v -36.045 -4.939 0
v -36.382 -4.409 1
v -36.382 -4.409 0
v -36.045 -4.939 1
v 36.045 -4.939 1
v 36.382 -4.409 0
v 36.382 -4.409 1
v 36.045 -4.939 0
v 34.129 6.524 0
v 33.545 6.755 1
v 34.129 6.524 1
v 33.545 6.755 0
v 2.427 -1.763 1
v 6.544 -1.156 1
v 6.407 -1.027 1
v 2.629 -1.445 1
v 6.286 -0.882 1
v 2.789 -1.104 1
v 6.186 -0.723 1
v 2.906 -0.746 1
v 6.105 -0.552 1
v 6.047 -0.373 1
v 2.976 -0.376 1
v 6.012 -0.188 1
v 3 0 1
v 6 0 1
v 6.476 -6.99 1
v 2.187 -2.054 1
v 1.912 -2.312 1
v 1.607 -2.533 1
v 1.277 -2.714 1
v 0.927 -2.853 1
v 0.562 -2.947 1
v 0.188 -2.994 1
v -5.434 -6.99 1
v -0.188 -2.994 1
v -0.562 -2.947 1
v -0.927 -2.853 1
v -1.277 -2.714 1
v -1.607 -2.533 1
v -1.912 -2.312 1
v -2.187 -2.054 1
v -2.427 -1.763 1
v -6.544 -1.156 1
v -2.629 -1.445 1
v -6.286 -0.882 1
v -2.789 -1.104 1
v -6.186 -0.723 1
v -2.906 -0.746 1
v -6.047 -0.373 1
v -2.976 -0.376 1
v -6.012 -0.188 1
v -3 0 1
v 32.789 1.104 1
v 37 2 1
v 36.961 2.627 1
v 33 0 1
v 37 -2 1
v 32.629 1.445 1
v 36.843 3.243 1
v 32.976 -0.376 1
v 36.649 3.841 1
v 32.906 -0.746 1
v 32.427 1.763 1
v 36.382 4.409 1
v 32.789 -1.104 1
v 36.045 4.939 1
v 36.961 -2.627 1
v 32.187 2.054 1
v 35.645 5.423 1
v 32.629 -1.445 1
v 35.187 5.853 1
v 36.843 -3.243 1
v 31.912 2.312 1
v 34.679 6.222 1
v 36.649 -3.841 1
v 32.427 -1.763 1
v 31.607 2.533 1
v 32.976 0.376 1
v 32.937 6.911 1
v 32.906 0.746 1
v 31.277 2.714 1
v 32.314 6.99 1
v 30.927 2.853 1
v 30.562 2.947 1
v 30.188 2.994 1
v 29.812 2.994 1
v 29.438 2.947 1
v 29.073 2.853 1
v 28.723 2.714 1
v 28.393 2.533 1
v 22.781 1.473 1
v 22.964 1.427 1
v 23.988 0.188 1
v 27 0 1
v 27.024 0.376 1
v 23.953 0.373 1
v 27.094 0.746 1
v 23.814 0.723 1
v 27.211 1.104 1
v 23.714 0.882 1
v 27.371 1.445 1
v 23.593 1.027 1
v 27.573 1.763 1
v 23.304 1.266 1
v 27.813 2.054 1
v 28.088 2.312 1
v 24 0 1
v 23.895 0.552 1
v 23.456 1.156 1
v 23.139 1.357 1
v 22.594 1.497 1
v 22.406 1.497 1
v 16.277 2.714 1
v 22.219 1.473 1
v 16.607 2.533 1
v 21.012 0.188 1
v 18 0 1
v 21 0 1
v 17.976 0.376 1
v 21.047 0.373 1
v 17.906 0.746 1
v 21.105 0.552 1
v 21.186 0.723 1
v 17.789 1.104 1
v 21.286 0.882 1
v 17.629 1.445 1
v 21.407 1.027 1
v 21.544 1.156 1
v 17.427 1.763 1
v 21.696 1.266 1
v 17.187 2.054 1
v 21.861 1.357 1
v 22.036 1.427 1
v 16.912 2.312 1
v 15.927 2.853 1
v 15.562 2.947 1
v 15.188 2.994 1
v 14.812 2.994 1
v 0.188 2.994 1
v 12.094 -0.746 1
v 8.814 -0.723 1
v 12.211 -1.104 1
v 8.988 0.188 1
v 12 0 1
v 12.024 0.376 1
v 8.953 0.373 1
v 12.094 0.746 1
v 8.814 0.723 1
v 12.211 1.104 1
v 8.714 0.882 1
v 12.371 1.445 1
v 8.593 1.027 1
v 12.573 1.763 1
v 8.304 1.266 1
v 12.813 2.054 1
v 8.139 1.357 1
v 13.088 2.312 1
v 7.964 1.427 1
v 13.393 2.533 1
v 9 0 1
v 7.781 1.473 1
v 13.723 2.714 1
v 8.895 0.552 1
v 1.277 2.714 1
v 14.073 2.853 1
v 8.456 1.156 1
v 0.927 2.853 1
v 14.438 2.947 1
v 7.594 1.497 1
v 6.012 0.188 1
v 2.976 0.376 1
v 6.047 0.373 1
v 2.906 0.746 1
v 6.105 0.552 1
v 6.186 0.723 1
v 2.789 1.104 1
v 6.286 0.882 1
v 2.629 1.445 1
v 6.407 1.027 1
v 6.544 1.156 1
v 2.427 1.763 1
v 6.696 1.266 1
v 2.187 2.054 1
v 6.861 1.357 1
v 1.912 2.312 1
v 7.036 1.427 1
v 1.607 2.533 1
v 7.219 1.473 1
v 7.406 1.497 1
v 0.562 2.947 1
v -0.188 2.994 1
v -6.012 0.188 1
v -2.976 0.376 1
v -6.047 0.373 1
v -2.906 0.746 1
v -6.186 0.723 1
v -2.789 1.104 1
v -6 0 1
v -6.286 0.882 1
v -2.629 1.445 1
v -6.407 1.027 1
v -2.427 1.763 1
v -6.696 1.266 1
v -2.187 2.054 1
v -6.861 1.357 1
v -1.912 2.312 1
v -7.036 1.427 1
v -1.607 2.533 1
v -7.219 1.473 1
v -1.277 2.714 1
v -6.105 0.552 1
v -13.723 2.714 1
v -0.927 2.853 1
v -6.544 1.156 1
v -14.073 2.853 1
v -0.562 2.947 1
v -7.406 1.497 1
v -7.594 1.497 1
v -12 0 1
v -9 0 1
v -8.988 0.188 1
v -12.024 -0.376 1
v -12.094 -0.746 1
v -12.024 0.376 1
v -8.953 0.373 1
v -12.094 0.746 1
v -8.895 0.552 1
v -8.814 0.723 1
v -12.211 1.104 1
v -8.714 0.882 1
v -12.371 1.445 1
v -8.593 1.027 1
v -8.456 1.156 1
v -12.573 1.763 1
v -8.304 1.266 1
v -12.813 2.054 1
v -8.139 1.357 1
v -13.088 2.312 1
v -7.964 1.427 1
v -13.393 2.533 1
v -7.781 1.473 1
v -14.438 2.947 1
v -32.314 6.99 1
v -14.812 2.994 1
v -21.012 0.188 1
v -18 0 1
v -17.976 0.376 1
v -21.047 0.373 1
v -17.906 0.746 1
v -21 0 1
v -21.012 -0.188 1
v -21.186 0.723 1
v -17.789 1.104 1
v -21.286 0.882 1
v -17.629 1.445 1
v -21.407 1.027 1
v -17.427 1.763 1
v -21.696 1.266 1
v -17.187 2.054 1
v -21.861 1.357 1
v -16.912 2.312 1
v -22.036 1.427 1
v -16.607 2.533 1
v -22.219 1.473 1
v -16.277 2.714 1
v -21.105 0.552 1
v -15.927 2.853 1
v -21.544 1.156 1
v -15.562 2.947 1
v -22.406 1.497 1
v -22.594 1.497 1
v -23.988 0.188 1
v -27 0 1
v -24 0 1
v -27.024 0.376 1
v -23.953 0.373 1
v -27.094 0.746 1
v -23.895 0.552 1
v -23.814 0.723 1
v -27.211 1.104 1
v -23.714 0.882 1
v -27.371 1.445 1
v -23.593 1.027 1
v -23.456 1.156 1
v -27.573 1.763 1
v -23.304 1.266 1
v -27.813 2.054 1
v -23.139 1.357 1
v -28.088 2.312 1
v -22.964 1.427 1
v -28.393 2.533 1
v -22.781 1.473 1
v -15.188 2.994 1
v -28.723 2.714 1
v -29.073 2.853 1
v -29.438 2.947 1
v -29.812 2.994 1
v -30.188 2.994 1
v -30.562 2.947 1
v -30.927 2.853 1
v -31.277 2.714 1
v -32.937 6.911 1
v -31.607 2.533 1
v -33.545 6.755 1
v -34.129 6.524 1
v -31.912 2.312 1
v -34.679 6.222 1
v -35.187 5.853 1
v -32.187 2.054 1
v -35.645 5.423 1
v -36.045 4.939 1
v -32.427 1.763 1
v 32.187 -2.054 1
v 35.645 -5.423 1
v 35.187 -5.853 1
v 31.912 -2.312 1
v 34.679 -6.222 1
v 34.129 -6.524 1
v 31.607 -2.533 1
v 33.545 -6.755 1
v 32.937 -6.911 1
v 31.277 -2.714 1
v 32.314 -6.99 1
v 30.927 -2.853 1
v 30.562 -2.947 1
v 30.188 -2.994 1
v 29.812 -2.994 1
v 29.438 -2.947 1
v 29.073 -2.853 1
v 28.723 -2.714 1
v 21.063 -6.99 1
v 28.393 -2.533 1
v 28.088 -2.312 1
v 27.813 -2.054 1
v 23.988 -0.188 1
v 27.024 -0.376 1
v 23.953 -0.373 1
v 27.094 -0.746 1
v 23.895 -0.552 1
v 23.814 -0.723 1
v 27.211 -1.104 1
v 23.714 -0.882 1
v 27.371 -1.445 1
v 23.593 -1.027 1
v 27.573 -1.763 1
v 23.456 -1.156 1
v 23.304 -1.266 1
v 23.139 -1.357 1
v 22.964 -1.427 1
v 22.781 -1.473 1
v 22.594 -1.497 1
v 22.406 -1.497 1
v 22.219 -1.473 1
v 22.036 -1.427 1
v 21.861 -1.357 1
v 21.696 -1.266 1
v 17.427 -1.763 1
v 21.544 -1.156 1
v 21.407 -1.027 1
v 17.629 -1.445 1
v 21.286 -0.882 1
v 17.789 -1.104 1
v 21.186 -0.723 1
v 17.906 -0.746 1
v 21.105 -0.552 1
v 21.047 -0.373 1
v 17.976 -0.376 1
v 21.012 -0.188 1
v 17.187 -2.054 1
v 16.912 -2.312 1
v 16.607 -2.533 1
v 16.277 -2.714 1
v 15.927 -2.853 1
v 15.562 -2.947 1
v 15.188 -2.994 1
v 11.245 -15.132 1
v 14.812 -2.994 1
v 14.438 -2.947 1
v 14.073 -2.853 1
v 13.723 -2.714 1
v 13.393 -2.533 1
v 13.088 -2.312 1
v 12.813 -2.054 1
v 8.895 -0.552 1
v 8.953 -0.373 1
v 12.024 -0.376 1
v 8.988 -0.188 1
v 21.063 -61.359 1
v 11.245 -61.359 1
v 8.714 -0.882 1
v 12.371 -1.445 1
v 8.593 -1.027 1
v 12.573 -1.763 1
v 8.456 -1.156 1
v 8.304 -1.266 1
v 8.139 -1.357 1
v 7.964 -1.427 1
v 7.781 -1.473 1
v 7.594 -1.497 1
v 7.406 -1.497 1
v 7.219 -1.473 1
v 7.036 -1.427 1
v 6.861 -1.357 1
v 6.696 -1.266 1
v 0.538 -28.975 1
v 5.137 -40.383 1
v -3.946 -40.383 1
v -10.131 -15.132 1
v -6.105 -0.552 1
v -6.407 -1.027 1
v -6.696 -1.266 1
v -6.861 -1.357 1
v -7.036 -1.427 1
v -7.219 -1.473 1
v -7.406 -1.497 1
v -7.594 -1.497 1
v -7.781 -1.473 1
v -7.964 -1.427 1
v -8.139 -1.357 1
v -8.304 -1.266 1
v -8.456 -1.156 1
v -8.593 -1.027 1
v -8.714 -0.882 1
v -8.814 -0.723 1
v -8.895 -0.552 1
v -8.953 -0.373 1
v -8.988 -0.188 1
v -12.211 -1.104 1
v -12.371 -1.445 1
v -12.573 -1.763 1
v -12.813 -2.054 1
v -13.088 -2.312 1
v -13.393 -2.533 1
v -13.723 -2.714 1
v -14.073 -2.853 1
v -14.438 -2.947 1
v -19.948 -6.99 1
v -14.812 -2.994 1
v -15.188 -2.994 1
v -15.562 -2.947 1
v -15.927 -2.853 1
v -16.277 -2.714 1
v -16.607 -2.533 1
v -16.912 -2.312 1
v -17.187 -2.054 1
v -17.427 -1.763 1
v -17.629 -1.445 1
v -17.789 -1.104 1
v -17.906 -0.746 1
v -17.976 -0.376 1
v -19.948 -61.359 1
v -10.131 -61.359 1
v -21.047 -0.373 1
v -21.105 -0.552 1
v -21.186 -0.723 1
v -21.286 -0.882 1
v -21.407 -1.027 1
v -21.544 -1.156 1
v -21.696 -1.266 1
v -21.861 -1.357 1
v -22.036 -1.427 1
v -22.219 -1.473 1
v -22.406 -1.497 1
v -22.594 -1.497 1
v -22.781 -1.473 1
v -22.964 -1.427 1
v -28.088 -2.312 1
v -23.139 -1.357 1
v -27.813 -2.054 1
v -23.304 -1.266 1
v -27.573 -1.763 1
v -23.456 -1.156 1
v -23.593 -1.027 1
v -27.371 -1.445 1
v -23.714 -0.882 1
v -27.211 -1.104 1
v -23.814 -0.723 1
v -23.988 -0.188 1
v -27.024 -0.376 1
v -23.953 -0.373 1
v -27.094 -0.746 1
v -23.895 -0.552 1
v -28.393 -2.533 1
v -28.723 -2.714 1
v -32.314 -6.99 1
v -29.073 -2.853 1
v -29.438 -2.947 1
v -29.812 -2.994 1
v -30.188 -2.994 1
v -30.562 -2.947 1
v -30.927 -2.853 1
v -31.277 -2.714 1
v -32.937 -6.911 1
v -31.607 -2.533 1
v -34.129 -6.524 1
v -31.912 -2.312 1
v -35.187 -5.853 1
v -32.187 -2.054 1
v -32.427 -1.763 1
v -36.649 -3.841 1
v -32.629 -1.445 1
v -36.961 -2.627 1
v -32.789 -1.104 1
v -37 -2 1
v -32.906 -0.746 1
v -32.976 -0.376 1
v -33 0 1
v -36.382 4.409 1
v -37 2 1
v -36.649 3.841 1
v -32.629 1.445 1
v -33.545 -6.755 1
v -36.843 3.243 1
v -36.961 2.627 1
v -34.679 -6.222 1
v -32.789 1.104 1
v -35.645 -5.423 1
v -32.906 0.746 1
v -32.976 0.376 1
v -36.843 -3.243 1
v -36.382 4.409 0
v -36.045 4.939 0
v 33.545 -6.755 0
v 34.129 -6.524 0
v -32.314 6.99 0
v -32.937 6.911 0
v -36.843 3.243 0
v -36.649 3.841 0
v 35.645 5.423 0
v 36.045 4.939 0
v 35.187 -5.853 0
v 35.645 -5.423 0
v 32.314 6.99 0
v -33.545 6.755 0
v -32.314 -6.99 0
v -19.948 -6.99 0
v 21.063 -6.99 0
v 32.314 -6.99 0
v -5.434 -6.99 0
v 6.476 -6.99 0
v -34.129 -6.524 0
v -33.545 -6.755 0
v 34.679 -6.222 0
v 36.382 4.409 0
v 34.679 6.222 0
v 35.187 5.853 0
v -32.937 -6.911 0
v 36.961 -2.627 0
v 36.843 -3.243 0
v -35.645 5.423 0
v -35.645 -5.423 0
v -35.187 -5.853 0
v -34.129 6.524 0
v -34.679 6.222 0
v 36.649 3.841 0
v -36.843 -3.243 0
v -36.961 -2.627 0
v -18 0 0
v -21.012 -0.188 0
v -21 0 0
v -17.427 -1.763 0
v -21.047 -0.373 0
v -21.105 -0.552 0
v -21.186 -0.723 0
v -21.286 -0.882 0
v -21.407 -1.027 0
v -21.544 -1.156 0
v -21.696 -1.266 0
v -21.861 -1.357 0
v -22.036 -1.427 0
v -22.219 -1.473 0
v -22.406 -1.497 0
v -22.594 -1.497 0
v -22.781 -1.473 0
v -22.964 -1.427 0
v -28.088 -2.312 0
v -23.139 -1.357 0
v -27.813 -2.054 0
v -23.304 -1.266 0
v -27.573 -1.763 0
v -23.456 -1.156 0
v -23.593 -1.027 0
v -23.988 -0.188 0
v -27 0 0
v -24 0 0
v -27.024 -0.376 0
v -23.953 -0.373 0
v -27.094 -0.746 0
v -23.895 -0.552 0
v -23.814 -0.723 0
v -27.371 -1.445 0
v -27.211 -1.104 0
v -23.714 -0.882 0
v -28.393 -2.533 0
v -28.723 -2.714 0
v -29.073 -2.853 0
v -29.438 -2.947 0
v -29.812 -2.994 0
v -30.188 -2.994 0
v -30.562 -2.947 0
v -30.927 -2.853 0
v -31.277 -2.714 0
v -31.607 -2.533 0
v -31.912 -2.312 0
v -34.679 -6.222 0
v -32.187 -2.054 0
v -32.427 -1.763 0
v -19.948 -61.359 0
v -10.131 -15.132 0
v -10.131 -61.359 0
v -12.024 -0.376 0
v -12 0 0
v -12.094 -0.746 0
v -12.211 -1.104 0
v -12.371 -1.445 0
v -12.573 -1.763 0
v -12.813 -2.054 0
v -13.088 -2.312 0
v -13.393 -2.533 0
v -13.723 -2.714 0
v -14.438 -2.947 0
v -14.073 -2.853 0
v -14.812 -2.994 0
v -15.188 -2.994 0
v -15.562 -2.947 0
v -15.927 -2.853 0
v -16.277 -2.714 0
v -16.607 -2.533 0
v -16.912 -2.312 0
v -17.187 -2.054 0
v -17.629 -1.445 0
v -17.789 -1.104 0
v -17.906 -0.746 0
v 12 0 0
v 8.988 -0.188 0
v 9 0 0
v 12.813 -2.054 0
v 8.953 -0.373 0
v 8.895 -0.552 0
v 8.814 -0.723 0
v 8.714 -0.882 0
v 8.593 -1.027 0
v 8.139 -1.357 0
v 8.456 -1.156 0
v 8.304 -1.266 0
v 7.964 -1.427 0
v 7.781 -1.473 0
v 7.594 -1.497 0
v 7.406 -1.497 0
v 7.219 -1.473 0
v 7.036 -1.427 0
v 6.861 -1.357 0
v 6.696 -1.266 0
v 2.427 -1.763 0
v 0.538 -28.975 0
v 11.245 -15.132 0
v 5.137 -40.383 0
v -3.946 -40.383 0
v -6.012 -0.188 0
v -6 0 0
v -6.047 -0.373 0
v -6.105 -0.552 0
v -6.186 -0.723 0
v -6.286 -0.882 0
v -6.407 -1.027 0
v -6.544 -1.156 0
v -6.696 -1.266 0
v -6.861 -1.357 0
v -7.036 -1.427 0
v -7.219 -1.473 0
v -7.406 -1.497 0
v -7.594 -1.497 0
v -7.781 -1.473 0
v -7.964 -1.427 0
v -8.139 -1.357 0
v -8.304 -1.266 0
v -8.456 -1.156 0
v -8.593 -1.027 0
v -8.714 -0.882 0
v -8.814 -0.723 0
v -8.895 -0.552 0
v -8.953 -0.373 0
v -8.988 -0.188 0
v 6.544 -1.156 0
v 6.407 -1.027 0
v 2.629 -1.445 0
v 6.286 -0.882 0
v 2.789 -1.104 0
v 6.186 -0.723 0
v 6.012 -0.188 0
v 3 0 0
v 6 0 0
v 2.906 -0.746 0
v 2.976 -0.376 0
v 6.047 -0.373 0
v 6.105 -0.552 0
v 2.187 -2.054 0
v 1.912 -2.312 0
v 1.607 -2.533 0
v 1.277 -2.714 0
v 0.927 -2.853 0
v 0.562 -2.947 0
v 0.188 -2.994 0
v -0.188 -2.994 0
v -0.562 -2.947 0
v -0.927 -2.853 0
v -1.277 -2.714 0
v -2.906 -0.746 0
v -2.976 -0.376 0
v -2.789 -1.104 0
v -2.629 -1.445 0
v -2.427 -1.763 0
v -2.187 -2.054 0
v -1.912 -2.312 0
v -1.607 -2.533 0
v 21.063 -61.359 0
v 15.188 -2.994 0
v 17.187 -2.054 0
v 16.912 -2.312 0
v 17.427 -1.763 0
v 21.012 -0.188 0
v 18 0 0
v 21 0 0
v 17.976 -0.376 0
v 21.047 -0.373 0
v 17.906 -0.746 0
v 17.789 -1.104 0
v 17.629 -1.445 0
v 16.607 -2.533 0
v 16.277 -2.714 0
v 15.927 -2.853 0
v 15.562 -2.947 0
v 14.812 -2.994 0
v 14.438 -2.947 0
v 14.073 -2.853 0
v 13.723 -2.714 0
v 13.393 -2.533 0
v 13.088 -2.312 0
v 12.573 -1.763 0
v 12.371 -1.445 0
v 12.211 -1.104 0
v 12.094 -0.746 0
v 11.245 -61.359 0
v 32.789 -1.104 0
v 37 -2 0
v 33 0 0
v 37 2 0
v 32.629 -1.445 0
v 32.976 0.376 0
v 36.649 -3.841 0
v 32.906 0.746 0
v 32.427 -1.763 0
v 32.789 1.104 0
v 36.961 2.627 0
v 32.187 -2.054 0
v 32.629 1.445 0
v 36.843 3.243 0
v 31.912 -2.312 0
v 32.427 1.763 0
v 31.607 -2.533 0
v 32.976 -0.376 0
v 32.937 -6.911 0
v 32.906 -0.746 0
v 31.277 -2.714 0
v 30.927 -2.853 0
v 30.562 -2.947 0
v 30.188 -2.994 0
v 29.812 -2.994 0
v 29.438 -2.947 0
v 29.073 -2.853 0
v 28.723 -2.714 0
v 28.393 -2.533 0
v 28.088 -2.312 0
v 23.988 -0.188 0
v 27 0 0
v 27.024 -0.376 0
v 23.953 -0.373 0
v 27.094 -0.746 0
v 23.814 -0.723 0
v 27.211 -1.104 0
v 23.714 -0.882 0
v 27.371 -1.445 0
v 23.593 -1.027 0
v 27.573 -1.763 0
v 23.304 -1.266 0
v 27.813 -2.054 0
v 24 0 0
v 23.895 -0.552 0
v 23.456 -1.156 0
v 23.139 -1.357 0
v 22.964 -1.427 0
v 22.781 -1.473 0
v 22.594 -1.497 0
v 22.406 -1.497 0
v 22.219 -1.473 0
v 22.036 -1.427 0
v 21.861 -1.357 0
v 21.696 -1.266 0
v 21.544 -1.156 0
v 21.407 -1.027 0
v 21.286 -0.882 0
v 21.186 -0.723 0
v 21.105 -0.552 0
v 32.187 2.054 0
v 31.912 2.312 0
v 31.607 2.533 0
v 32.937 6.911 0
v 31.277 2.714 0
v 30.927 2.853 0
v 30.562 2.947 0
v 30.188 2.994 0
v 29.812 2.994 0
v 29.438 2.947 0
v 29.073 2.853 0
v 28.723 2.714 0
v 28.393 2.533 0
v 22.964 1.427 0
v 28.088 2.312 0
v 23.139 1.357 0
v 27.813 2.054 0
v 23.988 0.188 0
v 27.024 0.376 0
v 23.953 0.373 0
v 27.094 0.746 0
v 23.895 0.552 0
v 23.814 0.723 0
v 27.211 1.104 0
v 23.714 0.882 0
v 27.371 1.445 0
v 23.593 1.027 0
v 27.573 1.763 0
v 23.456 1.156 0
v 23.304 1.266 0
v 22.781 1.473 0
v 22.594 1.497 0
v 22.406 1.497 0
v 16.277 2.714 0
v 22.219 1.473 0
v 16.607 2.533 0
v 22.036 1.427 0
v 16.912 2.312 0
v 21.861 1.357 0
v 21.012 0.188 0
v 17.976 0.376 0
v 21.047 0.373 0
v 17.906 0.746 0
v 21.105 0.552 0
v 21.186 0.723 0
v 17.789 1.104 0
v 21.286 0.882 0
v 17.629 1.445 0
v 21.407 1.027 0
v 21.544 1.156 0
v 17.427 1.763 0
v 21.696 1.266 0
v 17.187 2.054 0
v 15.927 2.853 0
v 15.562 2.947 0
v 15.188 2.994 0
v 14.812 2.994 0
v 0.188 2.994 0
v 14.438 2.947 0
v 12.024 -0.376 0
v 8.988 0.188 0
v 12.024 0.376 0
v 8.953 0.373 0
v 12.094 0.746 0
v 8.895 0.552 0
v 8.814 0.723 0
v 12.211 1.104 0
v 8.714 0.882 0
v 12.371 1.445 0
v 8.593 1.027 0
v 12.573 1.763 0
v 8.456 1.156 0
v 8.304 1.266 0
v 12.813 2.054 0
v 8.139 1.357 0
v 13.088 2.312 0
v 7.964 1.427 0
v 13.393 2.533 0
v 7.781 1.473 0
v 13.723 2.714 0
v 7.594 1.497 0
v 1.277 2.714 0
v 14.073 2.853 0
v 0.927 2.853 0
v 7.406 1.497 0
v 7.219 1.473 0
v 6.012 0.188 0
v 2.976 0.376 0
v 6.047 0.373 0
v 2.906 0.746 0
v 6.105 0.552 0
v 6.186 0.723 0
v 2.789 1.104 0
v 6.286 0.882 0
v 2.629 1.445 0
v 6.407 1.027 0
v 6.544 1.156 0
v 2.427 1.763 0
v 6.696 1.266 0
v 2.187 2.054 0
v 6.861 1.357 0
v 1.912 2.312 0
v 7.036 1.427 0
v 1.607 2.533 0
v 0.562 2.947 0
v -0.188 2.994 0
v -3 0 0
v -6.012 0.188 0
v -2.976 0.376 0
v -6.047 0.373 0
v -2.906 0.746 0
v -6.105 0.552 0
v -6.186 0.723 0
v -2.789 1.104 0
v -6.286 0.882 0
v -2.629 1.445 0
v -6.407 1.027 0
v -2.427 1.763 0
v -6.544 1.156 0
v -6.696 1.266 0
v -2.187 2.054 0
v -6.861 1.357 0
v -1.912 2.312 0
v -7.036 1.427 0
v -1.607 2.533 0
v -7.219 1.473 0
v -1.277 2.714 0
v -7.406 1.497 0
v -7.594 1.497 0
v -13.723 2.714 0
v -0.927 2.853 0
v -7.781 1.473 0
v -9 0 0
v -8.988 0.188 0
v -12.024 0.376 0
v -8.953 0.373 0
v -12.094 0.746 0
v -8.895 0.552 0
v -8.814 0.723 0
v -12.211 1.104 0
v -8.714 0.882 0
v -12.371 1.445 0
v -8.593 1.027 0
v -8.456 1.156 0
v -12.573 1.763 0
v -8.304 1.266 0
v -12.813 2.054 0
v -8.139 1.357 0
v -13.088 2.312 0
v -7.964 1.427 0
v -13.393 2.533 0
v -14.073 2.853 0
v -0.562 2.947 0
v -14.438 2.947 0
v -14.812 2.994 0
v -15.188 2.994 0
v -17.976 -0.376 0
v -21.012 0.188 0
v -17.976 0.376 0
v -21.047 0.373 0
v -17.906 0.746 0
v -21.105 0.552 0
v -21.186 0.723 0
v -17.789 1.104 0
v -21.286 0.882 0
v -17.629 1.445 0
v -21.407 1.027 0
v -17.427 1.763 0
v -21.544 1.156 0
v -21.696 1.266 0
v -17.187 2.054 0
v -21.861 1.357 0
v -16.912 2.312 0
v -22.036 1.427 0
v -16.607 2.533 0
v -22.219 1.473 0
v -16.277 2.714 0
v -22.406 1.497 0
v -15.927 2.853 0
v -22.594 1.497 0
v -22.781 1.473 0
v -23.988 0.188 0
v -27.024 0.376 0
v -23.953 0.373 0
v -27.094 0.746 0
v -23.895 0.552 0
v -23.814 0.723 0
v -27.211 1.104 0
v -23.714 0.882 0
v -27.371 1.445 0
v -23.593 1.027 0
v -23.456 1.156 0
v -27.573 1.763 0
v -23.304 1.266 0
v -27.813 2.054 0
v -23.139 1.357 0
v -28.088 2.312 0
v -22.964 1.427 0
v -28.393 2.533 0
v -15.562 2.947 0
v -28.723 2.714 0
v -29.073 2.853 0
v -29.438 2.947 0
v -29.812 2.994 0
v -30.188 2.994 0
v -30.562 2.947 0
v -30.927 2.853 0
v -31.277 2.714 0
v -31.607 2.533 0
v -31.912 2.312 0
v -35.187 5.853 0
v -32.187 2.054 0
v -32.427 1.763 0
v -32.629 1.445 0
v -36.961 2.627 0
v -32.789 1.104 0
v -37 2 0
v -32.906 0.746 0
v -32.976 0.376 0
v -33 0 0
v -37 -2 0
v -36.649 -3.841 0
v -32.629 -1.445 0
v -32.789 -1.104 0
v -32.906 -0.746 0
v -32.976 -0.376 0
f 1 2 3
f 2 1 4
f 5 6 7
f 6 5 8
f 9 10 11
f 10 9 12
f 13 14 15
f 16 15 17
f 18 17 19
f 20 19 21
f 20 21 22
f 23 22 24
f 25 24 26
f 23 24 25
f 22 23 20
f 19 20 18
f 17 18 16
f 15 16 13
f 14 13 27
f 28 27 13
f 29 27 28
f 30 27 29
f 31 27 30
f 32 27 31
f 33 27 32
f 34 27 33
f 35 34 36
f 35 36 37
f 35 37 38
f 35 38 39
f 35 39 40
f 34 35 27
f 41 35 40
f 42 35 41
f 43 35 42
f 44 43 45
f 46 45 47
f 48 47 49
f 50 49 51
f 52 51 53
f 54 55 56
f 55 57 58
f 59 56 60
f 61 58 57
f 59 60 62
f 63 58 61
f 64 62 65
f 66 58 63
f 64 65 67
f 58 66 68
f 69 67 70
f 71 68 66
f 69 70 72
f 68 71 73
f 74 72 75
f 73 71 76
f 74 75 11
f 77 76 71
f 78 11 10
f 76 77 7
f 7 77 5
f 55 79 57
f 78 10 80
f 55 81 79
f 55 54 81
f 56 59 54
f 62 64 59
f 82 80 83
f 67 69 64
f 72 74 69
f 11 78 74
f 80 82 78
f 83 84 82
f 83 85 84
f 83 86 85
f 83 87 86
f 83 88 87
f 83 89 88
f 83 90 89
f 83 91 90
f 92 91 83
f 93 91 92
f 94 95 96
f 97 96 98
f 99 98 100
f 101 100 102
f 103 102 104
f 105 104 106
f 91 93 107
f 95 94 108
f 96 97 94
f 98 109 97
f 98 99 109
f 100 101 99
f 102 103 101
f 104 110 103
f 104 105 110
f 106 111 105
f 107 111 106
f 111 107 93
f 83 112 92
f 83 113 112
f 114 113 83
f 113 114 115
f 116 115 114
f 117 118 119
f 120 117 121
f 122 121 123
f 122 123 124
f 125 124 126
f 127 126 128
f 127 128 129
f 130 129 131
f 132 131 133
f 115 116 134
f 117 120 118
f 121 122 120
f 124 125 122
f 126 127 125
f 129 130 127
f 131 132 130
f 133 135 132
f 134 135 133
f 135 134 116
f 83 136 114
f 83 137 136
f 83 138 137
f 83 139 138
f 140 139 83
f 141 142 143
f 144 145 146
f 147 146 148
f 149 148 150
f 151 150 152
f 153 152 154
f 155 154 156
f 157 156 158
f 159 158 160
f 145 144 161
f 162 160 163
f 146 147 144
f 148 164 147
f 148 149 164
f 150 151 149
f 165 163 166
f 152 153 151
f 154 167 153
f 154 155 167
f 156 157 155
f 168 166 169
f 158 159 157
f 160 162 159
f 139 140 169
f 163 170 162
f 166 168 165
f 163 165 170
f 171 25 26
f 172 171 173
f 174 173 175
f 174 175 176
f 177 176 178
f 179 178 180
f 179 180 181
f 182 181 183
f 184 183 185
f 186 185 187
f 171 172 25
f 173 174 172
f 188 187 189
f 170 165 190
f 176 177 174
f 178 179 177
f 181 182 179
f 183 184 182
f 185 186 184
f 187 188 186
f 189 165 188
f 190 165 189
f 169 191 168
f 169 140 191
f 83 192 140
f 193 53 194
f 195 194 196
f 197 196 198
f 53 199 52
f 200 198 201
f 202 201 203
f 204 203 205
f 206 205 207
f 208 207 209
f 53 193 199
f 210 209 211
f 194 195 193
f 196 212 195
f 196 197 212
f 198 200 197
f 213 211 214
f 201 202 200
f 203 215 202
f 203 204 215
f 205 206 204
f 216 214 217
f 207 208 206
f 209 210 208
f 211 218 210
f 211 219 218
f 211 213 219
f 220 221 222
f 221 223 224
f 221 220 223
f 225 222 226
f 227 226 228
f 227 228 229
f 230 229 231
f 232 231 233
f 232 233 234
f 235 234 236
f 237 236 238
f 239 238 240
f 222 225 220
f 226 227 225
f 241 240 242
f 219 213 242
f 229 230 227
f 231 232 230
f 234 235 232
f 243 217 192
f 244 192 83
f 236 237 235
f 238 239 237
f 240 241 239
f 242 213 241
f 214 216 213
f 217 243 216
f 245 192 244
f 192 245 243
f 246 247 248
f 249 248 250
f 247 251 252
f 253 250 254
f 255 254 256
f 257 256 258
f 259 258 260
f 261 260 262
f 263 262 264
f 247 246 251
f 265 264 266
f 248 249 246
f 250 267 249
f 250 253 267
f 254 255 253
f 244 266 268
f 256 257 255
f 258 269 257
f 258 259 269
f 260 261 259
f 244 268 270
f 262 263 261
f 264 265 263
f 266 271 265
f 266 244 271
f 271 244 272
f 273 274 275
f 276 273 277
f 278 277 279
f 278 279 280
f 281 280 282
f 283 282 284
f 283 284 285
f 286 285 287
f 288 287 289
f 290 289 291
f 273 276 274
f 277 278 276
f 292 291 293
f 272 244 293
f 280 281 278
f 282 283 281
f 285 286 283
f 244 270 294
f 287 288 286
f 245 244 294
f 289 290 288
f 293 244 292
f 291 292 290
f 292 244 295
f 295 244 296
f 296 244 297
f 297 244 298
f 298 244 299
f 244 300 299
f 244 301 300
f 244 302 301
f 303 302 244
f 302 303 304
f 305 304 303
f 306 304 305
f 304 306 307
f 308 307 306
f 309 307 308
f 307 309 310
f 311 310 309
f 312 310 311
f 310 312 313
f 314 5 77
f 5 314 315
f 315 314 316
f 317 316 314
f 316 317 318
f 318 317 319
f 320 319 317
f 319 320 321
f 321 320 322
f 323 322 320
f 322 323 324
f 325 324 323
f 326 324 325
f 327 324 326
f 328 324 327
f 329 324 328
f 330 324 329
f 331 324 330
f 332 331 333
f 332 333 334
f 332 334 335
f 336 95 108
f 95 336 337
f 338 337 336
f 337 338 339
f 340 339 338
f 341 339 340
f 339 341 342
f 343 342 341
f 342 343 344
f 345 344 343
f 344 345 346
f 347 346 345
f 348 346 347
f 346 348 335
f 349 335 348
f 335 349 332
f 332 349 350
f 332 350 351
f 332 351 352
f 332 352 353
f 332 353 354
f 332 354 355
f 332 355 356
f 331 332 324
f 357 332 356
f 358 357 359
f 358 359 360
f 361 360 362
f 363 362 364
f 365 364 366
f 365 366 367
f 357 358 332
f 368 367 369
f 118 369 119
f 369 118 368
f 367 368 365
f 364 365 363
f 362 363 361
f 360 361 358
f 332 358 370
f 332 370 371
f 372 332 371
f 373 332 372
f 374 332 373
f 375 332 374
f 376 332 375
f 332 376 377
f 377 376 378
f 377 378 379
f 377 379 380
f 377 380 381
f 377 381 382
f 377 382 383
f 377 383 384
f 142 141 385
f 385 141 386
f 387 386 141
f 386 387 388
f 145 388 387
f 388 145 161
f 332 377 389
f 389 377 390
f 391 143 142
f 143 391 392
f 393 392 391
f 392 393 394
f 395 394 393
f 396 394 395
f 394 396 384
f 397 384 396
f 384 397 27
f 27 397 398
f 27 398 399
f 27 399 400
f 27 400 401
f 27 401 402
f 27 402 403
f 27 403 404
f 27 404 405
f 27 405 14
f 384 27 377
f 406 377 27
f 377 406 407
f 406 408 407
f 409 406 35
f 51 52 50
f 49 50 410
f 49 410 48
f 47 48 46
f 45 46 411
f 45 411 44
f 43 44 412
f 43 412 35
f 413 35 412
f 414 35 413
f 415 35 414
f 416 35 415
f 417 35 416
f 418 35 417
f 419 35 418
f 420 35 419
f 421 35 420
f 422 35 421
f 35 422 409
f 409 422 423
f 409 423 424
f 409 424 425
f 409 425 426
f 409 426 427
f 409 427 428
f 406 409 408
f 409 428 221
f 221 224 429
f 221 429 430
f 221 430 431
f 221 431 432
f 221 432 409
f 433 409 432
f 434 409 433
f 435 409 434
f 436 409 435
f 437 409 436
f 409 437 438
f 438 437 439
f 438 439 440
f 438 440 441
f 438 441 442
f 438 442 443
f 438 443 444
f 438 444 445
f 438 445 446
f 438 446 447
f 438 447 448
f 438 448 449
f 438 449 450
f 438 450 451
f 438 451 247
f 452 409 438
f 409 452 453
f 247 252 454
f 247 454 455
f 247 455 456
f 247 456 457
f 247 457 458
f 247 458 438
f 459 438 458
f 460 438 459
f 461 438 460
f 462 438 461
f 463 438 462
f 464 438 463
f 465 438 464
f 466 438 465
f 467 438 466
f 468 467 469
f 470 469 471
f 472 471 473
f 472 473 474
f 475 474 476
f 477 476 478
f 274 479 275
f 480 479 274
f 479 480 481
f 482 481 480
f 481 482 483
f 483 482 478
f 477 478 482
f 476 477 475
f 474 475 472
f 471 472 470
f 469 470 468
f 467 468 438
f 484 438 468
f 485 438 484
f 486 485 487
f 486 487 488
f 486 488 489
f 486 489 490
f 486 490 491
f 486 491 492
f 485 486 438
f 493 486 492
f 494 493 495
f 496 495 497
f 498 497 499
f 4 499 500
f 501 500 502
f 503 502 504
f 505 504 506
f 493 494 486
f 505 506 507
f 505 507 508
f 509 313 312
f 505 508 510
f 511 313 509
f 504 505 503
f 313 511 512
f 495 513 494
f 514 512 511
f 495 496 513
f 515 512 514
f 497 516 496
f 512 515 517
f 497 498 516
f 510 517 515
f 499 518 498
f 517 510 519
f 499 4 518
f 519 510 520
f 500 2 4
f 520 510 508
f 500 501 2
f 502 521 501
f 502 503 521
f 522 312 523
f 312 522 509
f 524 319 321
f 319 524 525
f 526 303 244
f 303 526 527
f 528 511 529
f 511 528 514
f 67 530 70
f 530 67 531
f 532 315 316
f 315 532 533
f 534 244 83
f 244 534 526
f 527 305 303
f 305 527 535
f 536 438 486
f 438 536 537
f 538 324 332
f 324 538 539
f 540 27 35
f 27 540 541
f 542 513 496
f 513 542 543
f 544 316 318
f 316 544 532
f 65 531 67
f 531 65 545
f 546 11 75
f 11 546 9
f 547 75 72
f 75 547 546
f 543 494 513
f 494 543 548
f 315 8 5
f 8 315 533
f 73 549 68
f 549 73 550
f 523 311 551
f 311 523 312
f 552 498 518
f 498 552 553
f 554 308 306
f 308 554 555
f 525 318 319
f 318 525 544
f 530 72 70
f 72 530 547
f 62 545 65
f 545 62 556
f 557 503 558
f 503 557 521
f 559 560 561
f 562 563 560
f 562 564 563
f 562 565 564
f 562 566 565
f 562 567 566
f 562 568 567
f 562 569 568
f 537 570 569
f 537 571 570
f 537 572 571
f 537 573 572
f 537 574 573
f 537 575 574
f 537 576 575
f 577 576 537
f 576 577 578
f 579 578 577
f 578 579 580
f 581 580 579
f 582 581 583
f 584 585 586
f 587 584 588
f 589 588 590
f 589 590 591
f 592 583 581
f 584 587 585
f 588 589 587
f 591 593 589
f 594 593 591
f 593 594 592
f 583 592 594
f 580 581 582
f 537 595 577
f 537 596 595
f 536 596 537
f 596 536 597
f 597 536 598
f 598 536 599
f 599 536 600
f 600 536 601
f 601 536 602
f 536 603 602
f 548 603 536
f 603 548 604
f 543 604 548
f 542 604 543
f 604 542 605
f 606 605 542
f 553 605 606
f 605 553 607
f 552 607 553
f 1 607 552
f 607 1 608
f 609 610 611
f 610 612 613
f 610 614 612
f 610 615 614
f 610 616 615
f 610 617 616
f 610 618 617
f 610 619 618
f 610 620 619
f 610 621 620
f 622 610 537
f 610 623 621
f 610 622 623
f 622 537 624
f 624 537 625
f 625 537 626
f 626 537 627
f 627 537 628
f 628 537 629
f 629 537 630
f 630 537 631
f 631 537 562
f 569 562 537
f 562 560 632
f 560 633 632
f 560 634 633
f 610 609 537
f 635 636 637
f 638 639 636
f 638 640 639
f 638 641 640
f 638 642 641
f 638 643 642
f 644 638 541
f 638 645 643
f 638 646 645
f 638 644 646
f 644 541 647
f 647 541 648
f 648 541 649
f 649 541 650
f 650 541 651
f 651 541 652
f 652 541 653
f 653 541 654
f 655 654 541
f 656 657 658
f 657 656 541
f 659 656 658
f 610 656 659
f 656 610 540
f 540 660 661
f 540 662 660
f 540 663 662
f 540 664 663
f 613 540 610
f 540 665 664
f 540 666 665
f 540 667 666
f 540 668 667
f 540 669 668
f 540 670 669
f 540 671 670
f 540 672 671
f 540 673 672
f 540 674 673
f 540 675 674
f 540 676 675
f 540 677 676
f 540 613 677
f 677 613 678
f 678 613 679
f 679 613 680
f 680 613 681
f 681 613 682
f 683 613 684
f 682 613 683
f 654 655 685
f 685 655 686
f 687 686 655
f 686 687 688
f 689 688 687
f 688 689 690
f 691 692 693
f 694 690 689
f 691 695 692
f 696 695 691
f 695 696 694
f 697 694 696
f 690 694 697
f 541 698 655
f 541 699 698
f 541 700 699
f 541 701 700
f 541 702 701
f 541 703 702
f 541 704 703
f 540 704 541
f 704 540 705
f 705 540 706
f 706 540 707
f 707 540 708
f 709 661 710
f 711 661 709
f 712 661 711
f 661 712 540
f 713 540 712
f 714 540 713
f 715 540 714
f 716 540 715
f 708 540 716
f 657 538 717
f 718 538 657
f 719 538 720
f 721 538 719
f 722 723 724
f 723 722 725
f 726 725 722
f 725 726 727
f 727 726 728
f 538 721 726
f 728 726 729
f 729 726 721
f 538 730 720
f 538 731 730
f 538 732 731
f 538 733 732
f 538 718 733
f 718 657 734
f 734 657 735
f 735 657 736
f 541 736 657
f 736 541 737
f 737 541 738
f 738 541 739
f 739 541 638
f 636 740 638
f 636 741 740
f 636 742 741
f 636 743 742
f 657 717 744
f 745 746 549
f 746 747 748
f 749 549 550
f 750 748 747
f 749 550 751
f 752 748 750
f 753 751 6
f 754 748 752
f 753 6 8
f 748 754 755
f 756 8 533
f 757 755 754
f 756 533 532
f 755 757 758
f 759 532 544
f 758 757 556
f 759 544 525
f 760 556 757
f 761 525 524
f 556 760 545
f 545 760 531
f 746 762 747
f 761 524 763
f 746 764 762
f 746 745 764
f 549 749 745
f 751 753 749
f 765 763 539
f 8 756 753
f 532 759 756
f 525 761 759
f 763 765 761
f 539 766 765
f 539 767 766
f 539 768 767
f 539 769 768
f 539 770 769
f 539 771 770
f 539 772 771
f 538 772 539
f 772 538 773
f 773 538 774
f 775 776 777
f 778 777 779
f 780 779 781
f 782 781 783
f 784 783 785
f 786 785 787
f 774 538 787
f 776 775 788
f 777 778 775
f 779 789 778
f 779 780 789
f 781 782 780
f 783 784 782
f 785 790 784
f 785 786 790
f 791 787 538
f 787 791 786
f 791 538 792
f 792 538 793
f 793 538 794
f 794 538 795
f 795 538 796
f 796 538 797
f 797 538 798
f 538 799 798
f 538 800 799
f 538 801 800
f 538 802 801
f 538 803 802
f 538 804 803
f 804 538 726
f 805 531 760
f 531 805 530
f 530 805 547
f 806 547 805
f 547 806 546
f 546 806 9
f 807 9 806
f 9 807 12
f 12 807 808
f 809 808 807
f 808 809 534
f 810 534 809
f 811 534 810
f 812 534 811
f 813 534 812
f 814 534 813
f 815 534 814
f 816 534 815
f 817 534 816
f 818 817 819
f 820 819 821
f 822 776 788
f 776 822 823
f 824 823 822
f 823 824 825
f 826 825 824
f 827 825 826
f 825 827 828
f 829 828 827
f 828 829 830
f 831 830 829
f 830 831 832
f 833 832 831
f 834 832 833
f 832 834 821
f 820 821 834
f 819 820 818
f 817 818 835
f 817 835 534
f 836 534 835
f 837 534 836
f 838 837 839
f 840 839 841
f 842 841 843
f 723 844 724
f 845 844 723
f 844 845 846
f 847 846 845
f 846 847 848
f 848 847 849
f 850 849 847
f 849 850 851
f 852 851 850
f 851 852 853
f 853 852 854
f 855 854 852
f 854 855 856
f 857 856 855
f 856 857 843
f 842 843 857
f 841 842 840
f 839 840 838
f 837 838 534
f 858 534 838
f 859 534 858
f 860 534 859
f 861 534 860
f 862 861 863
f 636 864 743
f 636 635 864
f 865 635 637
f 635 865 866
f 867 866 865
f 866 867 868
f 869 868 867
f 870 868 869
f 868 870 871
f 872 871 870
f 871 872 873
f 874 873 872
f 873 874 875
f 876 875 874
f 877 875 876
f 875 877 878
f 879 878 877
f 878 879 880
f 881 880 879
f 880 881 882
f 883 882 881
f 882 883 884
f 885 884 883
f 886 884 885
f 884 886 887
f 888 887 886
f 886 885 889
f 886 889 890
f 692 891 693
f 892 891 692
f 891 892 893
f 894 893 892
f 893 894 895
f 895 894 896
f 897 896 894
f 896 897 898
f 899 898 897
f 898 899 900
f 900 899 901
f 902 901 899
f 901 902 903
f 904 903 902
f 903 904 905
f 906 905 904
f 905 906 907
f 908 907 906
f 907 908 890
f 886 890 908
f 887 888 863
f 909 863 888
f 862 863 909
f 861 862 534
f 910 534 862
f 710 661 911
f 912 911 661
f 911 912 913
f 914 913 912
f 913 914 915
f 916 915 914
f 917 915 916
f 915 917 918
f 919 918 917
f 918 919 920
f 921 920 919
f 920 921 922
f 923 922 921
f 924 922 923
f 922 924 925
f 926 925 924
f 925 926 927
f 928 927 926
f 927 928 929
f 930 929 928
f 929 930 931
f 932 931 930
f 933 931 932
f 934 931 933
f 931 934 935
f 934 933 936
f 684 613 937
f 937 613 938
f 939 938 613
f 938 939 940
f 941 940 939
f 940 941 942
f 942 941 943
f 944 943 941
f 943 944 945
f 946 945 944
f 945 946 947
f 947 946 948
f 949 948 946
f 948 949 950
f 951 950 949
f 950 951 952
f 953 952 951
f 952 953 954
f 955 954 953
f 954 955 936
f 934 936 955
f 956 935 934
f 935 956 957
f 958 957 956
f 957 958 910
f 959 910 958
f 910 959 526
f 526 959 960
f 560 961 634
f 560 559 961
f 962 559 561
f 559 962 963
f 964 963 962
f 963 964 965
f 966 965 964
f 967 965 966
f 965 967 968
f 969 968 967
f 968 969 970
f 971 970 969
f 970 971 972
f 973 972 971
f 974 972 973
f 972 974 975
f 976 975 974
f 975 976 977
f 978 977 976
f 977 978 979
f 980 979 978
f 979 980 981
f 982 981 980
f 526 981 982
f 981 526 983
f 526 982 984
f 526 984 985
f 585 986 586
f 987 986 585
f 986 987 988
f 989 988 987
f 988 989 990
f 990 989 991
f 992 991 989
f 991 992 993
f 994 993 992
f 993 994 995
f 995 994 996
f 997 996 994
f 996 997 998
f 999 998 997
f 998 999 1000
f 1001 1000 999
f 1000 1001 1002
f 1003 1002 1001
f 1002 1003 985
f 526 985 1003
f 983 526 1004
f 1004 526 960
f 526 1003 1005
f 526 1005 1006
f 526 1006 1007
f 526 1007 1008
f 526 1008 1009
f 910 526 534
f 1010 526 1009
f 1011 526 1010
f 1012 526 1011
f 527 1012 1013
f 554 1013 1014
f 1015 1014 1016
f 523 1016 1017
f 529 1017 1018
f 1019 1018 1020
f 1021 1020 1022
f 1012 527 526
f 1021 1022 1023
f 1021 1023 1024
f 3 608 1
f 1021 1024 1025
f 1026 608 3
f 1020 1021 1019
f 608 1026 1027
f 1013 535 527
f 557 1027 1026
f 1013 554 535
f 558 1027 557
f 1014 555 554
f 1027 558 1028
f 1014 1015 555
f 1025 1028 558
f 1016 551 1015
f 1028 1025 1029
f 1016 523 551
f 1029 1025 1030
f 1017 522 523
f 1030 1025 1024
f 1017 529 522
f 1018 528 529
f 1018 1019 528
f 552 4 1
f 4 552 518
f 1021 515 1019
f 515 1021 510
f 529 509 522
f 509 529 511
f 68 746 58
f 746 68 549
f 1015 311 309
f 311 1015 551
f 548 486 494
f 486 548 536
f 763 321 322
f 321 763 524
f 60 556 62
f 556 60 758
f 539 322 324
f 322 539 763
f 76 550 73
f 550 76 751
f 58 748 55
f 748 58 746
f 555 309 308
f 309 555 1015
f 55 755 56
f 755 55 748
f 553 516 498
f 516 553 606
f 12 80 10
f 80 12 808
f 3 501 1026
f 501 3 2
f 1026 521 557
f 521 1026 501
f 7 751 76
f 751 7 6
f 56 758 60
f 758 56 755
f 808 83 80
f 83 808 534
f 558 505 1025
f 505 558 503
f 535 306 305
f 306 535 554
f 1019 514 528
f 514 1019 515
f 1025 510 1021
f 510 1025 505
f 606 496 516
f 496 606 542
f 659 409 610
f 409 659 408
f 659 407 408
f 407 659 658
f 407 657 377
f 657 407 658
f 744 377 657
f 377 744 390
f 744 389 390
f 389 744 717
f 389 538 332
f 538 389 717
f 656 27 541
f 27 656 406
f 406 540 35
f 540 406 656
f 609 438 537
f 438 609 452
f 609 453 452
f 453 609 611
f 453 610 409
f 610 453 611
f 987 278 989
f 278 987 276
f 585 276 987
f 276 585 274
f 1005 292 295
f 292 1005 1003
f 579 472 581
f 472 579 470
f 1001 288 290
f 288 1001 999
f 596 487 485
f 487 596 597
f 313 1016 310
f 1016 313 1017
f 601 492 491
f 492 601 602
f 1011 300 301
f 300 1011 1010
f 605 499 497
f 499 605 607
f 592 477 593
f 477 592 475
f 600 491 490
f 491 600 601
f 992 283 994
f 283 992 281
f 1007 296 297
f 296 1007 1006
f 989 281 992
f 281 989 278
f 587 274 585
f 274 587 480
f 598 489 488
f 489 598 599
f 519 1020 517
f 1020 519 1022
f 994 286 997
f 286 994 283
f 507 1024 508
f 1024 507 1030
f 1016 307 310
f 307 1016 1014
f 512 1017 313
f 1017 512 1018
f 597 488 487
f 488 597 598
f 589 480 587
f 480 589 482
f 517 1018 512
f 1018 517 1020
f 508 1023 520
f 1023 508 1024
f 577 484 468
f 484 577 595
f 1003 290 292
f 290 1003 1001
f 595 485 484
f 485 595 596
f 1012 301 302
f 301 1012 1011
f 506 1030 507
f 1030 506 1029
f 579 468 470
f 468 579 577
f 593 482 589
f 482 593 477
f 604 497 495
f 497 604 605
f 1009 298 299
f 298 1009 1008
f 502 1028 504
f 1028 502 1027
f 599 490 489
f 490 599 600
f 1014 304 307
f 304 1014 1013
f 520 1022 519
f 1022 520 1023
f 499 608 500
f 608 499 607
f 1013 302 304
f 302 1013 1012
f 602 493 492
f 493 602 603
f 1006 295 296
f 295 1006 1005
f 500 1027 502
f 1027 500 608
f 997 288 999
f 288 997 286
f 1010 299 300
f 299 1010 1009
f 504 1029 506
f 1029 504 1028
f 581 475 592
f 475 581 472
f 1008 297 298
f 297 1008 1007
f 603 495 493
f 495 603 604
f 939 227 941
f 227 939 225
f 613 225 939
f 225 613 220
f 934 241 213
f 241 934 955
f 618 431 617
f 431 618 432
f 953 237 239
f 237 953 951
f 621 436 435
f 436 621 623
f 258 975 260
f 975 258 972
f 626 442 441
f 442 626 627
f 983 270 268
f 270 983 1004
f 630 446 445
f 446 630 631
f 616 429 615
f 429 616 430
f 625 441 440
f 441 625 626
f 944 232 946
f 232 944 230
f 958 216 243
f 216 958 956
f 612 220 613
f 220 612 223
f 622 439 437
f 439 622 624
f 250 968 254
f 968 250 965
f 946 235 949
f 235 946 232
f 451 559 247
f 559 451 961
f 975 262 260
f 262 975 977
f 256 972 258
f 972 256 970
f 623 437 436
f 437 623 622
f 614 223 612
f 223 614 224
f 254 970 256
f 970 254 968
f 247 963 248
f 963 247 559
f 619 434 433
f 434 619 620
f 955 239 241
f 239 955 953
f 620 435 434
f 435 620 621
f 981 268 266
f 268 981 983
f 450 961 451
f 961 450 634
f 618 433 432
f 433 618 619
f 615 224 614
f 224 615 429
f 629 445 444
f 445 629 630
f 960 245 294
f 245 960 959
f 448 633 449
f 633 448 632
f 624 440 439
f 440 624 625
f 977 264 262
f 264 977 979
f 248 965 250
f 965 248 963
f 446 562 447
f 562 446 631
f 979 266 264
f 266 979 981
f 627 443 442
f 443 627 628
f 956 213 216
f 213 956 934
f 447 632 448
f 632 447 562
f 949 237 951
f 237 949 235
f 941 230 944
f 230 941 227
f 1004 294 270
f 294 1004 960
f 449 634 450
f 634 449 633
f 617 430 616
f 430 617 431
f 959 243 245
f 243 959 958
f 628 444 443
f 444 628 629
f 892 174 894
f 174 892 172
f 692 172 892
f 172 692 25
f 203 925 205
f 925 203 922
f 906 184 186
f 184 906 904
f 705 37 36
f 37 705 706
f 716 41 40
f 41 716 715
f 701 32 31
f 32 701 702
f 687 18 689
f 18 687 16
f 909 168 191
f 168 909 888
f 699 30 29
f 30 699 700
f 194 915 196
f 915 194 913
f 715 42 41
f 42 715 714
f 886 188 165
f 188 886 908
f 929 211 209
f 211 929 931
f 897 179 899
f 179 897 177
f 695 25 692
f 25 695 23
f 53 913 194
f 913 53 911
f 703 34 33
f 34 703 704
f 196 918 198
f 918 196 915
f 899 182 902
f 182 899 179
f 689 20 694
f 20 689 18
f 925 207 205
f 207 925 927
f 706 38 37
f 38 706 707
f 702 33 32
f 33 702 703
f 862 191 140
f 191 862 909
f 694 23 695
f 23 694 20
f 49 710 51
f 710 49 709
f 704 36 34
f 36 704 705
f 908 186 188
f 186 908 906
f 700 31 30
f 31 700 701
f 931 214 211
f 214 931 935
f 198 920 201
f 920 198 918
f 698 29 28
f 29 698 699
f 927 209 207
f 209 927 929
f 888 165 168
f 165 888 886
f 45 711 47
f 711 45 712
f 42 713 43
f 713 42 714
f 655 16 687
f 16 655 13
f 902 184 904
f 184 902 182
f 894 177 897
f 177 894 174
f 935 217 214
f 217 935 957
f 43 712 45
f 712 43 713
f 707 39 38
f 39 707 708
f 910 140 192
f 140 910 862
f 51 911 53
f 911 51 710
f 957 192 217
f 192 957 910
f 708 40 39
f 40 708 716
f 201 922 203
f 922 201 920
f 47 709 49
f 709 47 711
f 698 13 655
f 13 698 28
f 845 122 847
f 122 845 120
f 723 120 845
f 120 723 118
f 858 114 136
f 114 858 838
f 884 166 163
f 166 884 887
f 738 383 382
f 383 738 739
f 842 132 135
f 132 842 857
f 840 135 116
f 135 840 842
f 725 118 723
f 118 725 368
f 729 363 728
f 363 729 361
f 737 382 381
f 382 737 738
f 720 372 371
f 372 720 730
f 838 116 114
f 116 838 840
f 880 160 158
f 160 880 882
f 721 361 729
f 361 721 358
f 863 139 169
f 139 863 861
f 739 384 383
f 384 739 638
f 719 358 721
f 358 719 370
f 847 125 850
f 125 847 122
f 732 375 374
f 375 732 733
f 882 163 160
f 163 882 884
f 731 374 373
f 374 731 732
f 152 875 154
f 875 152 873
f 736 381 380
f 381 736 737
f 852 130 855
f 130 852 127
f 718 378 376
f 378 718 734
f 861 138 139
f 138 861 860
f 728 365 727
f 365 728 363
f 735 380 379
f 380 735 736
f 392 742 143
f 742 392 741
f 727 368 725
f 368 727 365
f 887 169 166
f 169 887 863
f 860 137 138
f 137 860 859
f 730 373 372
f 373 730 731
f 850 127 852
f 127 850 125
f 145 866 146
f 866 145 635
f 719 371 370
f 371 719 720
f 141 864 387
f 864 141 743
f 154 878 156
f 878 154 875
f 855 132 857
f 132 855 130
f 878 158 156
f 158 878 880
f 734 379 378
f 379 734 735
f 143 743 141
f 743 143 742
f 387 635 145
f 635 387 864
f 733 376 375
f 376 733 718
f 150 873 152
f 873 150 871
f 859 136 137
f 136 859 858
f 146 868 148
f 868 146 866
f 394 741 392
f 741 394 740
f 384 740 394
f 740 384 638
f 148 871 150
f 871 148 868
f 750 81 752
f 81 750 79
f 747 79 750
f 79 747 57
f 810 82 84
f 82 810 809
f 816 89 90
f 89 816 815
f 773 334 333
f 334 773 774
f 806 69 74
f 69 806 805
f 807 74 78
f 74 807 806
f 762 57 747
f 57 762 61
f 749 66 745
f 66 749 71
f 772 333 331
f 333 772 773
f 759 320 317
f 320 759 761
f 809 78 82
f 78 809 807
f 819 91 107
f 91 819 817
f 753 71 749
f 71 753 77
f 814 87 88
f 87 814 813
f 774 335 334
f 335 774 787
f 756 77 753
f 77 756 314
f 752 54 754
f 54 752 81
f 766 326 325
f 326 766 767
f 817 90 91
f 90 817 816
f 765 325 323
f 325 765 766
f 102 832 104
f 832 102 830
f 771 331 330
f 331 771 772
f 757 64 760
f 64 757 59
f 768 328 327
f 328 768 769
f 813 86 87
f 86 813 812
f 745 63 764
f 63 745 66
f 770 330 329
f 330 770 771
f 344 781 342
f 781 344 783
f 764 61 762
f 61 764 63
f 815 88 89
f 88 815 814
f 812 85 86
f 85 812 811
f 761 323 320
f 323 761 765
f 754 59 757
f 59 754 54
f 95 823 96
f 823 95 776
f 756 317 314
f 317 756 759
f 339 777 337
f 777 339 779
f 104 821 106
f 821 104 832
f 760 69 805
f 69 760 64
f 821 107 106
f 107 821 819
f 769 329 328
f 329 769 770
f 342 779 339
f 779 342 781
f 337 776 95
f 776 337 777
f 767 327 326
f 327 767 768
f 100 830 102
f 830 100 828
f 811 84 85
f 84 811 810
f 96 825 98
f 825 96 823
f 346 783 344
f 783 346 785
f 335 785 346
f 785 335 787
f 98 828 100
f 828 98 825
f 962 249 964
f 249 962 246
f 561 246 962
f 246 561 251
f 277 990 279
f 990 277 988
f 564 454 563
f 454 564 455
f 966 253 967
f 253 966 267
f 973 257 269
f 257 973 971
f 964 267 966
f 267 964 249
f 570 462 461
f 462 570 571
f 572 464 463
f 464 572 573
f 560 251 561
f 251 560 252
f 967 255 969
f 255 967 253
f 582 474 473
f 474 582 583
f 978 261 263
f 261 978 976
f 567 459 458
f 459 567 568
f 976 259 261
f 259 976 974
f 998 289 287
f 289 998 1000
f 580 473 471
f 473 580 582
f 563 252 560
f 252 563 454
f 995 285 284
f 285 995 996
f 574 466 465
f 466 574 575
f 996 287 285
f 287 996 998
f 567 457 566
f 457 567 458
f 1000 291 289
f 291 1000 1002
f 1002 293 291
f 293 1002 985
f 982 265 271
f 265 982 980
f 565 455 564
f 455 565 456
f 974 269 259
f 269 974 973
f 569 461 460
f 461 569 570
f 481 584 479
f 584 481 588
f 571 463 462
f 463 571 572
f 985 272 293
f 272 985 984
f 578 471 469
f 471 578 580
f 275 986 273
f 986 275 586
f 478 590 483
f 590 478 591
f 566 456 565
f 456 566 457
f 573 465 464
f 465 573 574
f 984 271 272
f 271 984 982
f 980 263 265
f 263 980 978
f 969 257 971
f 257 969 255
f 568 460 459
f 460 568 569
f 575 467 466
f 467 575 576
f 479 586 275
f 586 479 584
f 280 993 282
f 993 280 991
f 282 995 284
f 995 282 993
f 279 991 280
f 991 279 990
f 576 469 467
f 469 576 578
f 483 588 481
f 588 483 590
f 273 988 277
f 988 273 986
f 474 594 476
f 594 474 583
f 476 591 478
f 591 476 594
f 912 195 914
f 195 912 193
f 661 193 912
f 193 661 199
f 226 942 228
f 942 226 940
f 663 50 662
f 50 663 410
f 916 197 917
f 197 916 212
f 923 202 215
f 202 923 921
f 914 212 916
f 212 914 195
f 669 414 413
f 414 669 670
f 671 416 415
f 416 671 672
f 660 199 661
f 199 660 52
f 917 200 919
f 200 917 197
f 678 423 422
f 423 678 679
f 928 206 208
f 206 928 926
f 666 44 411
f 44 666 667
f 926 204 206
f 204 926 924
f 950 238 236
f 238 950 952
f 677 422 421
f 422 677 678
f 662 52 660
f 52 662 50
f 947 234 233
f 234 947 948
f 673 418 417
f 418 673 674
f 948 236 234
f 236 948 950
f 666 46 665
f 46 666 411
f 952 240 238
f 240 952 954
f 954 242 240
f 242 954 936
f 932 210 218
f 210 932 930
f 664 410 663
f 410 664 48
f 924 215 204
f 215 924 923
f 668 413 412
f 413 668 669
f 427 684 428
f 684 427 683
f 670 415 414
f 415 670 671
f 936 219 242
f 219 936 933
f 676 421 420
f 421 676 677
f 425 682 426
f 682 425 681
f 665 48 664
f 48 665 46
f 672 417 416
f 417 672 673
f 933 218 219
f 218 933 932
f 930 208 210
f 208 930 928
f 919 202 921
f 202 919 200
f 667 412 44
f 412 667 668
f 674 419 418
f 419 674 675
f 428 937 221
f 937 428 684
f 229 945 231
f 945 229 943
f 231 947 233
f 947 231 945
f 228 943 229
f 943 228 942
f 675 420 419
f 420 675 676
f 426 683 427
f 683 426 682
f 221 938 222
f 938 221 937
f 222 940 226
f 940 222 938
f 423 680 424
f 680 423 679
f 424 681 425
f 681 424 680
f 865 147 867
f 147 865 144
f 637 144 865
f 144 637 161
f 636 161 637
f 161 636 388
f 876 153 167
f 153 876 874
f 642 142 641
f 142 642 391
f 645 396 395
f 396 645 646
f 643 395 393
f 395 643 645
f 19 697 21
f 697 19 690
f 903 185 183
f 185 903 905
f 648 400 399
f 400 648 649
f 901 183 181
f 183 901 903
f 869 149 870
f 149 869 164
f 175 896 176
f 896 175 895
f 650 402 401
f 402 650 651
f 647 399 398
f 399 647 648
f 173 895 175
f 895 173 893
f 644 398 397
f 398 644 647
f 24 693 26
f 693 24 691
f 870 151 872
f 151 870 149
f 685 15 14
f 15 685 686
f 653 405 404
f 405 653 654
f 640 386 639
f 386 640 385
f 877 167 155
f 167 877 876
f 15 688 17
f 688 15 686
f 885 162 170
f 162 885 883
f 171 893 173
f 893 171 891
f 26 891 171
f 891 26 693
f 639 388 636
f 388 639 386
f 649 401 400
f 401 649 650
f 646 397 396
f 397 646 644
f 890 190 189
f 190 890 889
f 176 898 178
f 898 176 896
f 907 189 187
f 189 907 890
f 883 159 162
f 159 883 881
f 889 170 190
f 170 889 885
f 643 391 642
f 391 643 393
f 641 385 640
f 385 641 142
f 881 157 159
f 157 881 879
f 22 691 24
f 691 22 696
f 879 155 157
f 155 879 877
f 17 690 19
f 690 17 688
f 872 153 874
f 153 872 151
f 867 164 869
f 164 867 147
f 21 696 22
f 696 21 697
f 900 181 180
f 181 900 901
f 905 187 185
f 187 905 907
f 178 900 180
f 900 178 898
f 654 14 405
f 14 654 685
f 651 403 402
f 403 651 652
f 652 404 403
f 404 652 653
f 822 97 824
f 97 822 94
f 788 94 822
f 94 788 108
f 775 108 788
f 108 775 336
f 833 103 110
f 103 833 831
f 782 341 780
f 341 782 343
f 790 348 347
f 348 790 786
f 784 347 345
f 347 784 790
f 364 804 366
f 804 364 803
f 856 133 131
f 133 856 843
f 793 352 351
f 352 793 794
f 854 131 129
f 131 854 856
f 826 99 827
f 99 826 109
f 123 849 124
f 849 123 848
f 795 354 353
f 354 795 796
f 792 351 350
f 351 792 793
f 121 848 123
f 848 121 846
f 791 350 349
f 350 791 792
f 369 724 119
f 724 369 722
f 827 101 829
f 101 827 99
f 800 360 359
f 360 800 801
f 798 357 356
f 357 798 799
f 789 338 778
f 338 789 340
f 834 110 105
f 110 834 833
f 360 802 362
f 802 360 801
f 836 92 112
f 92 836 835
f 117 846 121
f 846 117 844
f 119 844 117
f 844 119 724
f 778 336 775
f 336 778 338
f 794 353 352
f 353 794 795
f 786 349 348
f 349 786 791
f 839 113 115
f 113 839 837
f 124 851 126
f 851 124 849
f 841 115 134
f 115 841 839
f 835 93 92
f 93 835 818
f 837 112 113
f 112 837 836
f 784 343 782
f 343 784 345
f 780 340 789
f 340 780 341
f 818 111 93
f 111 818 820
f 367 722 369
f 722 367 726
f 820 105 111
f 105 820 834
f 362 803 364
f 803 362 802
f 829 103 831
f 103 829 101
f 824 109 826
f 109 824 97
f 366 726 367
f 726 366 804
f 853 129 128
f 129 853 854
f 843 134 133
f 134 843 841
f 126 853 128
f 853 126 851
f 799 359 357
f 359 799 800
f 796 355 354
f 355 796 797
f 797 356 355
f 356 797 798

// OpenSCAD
$fn = 50;


difference() {
	union() {
		*color(alpha = 1.0000000000, c = "gray") {
			translate(v = [0, 14, 0]) {
				linear_extrude(height = 1) {
					text(font = "Arial:style=Bold", halign = "center", size = 4.5000000000, text = "COMMENT description oobb_plate_shape_p_type_1_depth_5_width_1_thickness_m_extra_oobb_size", valign = "center");
				}
			}
		}
		hull() {
			translate(v = [-32.0000000000, 2.0000000000, 0]) {
				cylinder(h = 1, r = 5);
			}
			translate(v = [32.0000000000, 2.0000000000, 0]) {
				cylinder(h = 1, r = 5);
			}
			translate(v = [-32.0000000000, -2.0000000000, 0]) {
				cylinder(h = 1, r = 5);
			}
			translate(v = [32.0000000000, -2.0000000000, 0]) {
				cylinder(h = 1, r = 5);
			}
		}
		translate(v = [0, -5, 0]) {
			linear_extrude(height = 1) {
				text(font = "DejaVu Sans Mono:style=Bold", halign = "center", size = 57.0000000000, text = "M", valign = "top");
			}
		}
	}
	union() {
		*color(alpha = 1.0000000000, c = "gray") {
			translate(v = [0, 14, 0]) {
				linear_extrude(height = 1) {
					text(font = "Arial:style=Bold", halign = "center", size = 4.5000000000, text = "COMMENT description oobb_holes_shape_n_type_5_width_1_thickness_m_extra_oobb_size_1_height_'all'_holes_true_both_holes", valign = "center");
				}
			}
		}
		translate(v = [-30.0000000000, 0.0000000000, 0]) {
			translate(v = [0, 0, -50]) {
				cylinder(h = 100, r = 3.0000000000);
			}
		}
		translate(v = [-15.0000000000, 0.0000000000, 0]) {
			translate(v = [0, 0, -50]) {
				cylinder(h = 100, r = 3.0000000000);
			}
		}
		translate(v = [0, 0, -50]) {
			cylinder(h = 100, r = 3.0000000000);
		}
		translate(v = [15.0000000000, 0.0000000000, 0]) {
			translate(v = [0, 0, -50]) {
				cylinder(h = 100, r = 3.0000000000);
			}
		}
		translate(v = [30.0000000000, 0.0000000000, 0]) {
			translate(v = [0, 0, -50]) {
				cylinder(h = 100, r = 3.0000000000);
			}
		}
		translate(v = [-30.0000000000, 0.0000000000, 0]) {
			translate(v = [0, 0, -50]) {
				cylinder(h = 100, r = 1.5000000000);
			}
		}
		translate(v = [-22.5000000000, 0.0000000000, 0]) {
			translate(v = [0, 0, -50]) {
				cylinder(h = 100, r = 1.5000000000);
			}
		}
		translate(v = [-15.0000000000, 0.0000000000, 0]) {
			translate(v = [0, 0, -50]) {
				cylinder(h = 100, r = 1.5000000000);
			}
		}
		translate(v = [-7.5000000000, 0.0000000000, 0]) {
			translate(v = [0, 0, -50]) {
				cylinder(h = 100, r = 1.5000000000);
			}
		}
		translate(v = [0, 0, -50]) {
			cylinder(h = 100, r = 1.5000000000);
		}
		translate(v = [7.5000000000, 0.0000000000, 0]) {
			translate(v = [0, 0, -50]) {
				cylinder(h = 100, r = 1.5000000000);
			}
		}
		translate(v = [15.0000000000, 0.0000000000, 0]) {
			translate(v = [0, 0, -50]) {
				cylinder(h = 100, r = 1.5000000000);
			}
		}
		translate(v = [22.5000000000, 0.0000000000, 0]) {
			translate(v = [0, 0, -50]) {
				cylinder(h = 100, r = 1.5000000000);
			}
		}
		translate(v = [30.0000000000, 0.0000000000, 0]) {
			translate(v = [0, 0, -50]) {
				cylinder(h = 100, r = 1.5000000000);
			}
		}
	}
}
